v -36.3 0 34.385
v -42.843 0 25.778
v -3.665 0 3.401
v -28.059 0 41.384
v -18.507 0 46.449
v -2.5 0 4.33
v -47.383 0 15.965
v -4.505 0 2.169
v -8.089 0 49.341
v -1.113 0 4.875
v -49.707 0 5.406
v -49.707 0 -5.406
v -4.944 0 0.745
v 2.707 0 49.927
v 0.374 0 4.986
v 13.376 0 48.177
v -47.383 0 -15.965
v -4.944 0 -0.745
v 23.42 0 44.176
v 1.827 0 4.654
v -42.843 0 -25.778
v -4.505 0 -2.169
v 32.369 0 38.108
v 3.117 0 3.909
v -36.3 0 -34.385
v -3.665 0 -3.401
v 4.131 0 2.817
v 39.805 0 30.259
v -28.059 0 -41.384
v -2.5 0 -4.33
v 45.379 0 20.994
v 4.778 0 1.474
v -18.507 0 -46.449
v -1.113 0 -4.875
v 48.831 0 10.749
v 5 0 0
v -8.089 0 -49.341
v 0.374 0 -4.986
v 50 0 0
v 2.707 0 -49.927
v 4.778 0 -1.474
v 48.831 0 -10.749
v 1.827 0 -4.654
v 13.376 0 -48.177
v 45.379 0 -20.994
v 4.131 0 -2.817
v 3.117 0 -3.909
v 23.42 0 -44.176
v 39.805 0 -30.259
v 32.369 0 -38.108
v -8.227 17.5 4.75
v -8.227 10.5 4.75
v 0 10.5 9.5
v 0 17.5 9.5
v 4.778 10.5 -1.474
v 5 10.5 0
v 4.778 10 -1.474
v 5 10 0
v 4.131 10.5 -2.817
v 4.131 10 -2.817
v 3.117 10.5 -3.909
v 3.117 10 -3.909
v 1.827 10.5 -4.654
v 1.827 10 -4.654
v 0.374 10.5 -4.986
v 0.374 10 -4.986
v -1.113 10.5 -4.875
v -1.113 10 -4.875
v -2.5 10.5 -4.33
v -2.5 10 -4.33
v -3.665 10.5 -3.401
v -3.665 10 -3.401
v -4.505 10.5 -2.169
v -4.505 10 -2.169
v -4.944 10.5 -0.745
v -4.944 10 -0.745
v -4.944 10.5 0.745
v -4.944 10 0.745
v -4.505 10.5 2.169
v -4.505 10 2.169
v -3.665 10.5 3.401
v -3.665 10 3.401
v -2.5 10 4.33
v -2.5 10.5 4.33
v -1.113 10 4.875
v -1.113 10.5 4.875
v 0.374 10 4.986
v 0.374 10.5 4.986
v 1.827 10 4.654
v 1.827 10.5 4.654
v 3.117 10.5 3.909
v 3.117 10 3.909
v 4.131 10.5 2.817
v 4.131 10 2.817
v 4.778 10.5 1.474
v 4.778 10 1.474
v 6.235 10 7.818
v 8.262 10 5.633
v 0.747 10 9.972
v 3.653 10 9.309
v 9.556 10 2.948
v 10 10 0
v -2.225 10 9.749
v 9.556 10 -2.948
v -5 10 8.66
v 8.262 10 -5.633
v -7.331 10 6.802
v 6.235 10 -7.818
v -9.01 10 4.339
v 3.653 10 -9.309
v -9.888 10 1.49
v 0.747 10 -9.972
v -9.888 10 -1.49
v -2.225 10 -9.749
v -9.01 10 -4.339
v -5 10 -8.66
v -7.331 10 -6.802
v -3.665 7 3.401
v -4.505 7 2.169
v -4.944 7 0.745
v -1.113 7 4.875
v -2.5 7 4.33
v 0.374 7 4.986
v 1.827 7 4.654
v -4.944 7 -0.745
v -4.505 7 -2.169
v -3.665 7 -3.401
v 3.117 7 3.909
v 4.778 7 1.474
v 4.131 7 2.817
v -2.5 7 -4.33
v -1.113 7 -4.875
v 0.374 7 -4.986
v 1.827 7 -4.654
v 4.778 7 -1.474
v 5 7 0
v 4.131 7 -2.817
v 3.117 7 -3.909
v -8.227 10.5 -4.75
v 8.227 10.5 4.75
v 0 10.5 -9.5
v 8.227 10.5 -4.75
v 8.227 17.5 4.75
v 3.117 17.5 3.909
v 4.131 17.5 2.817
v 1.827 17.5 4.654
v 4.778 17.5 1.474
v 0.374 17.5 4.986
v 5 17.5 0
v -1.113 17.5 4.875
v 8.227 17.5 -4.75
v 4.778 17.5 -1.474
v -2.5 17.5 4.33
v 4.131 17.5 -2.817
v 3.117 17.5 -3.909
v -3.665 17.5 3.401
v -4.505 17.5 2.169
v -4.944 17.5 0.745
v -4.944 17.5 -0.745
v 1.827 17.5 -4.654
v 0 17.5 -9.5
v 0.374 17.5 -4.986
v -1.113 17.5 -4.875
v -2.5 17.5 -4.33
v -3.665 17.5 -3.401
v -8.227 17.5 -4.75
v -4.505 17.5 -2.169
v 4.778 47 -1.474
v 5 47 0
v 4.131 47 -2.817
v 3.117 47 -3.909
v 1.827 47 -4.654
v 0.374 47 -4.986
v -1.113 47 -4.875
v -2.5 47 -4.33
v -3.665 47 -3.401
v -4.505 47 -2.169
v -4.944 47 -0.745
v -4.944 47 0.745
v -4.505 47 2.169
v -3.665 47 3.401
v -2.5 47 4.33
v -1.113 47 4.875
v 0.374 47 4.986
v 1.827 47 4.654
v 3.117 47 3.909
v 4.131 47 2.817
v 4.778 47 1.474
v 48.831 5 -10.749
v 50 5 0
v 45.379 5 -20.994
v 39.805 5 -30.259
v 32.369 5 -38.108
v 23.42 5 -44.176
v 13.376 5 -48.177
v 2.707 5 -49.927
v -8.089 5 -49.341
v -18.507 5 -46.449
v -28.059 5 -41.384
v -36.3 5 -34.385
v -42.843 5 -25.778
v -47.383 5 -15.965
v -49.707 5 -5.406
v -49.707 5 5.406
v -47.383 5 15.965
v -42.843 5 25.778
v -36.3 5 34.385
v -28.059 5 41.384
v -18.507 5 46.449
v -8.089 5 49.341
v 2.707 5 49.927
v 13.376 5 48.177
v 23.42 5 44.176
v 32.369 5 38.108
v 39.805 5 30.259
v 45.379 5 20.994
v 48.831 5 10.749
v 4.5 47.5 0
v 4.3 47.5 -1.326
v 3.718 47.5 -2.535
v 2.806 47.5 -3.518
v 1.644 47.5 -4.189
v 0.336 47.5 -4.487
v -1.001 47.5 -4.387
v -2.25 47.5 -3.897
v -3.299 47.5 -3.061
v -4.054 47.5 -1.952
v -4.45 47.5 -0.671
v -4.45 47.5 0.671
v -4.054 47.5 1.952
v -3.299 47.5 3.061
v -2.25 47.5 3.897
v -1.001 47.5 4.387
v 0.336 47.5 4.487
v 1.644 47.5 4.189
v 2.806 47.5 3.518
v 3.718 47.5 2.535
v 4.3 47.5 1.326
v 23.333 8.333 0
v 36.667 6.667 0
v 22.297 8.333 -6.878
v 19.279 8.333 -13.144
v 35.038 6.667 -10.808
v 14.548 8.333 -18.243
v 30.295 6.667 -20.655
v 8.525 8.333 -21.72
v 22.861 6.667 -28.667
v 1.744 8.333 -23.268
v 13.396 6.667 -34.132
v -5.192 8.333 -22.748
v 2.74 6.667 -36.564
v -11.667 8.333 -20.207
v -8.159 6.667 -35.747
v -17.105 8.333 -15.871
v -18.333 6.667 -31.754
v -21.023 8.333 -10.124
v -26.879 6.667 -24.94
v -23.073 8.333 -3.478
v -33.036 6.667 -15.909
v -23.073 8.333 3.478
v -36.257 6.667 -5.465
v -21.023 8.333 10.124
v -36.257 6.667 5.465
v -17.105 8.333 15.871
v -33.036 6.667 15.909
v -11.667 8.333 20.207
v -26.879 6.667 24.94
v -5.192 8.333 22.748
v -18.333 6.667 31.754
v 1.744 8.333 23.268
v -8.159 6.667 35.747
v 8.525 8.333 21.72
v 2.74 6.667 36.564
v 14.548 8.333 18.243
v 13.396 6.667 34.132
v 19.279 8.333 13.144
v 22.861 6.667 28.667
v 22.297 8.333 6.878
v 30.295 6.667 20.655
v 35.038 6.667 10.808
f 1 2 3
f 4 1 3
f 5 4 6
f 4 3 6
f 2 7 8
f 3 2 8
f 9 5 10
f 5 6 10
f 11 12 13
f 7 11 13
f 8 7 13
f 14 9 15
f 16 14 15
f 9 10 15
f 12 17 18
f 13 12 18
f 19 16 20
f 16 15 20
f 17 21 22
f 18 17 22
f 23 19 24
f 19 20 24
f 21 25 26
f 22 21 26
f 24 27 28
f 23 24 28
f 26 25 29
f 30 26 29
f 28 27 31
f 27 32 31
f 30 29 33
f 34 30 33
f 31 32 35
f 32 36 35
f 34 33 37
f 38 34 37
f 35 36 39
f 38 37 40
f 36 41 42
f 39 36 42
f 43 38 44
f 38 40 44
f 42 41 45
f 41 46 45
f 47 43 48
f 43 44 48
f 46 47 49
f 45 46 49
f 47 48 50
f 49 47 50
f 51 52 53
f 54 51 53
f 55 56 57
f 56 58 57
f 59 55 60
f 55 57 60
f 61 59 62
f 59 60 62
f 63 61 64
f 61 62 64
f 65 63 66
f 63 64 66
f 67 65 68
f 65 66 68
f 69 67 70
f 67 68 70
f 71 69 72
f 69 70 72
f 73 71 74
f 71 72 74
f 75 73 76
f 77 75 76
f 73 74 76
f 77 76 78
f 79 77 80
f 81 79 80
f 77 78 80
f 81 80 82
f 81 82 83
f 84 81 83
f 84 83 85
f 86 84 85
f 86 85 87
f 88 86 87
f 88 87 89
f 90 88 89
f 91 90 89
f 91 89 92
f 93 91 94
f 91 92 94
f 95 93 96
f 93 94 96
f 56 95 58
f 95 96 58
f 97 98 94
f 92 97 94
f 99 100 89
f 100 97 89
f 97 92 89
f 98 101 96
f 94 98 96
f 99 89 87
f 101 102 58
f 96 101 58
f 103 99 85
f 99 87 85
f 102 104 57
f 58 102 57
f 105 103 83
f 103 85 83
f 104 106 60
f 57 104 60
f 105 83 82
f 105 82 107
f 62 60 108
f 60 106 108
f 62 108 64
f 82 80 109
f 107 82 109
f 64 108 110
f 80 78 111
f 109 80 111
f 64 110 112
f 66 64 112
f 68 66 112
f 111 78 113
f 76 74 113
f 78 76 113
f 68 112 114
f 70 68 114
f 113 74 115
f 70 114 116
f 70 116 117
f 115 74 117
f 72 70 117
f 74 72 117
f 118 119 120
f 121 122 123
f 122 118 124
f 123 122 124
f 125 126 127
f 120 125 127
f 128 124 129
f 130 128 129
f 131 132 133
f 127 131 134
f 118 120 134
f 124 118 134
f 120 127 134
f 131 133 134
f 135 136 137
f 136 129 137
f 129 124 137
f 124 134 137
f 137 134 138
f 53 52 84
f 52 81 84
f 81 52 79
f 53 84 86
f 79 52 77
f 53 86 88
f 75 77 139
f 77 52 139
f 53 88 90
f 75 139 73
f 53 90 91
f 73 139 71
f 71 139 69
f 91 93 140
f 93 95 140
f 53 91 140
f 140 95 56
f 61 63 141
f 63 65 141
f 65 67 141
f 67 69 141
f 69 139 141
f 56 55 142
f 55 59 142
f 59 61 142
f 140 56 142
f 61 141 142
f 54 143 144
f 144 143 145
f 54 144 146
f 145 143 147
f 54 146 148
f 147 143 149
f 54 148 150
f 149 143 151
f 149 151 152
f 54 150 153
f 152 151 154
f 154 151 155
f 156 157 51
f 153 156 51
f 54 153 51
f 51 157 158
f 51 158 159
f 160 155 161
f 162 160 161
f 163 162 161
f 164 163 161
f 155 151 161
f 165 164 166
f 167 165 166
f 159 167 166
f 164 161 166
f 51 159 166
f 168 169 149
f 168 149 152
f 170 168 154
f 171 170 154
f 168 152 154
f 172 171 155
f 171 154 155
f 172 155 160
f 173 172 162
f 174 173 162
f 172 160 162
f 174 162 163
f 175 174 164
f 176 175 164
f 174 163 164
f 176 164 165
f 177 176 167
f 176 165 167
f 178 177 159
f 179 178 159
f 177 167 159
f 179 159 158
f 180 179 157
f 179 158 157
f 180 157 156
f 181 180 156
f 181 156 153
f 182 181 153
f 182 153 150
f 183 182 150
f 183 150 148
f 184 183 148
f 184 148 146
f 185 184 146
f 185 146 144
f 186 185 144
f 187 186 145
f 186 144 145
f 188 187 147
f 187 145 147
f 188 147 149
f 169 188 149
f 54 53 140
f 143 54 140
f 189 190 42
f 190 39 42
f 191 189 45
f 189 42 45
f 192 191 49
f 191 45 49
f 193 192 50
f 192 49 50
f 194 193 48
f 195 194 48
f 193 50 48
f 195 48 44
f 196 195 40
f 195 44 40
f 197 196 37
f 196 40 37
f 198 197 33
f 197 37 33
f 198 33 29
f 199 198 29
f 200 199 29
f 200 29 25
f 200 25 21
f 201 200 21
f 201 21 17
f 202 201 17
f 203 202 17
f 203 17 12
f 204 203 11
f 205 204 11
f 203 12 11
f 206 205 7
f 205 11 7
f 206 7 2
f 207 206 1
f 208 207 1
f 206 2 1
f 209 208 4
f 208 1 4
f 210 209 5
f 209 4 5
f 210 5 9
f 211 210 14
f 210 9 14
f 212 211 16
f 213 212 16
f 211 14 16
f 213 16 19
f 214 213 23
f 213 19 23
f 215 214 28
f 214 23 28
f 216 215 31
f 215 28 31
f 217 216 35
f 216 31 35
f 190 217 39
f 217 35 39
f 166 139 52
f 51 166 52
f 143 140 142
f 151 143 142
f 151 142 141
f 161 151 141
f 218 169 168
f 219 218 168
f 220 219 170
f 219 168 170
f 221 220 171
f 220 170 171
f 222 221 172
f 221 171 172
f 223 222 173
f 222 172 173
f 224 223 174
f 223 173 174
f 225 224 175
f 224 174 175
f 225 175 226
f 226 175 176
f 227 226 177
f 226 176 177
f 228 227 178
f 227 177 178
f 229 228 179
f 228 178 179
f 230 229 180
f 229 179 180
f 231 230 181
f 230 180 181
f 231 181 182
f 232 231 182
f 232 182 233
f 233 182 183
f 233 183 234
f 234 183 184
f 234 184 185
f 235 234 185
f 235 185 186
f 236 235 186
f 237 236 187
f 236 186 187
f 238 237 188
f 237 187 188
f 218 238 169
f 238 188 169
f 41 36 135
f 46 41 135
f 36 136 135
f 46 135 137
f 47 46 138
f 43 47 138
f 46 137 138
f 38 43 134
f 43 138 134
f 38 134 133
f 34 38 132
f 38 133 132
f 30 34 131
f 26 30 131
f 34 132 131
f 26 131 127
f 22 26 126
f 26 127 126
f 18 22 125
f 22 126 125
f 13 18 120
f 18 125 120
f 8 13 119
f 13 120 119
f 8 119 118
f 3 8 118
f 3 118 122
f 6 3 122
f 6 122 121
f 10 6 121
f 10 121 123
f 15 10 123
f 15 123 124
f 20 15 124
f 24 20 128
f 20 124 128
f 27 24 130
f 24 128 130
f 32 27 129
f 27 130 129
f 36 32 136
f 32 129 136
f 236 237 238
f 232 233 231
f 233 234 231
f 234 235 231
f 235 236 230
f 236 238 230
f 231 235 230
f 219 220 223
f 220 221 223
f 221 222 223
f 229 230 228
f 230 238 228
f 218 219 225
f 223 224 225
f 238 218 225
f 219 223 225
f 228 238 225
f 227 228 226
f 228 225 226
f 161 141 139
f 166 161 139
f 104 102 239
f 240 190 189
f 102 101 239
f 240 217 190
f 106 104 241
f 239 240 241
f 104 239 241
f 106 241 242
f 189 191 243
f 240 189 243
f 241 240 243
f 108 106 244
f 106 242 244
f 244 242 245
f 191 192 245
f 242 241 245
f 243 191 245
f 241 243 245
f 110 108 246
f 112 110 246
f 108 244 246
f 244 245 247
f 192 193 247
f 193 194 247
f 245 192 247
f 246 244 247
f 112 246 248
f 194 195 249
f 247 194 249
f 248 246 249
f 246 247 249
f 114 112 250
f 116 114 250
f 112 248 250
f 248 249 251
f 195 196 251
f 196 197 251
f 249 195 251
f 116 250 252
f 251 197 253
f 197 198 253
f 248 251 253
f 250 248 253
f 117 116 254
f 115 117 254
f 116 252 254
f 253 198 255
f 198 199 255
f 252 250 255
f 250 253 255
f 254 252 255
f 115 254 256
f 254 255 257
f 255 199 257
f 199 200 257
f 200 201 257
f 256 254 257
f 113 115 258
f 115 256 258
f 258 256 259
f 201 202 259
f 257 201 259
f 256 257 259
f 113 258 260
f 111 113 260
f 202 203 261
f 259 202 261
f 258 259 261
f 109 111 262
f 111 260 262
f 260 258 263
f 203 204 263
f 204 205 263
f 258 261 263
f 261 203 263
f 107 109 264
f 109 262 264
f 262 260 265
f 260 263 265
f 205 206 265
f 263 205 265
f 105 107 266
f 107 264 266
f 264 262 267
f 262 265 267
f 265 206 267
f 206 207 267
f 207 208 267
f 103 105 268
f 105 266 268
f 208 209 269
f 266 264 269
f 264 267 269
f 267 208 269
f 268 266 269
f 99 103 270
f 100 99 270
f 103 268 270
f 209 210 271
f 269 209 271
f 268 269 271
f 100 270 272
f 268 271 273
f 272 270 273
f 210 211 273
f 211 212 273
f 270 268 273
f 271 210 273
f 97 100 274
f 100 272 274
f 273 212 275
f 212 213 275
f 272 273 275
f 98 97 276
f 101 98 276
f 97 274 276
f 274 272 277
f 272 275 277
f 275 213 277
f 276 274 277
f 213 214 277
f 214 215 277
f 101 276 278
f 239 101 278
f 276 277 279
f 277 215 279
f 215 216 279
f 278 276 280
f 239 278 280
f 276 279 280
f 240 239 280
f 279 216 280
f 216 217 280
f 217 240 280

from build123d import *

# Parameters (mm, degrees)
CHAMFER_1_SIZE      = 0.5
CUT_EXTRUDE_START   = -7
SKETCH_2_R          = 12.139773641
CUT_EXTRUDE_1_DEPTH = 7


with BuildPart() as part:
    # Эскиз1 → Повернуть1 (revolve)
    with BuildSketch(Plane.XY, mode=Mode.PRIVATE) as revolve_1_sk:
        Polygon((0, 47.5), (-5, 47.5), (-5, 17.5), (-9.5, 17.5), (-9.5, 10.5), (-5, 10.5), (-5, 10), (-10, 10), (-50, 5), (-50, 0), (-5, 0), (-5, 7), (0, 7), align=None)
    revolve(revolve_1_sk.sketch.rotate(Axis((0, 0, 0), (0, 1, 0)), 180), axis=Axis((0, 0, 0), (0, 1, 0)))  # turned: the seam where the file's is

    # Фаска1
    chamfer_1_edges = [part.edges().sort_by_distance(p)[0] for p in [
        (-5, 47.5, 0),
    ]]
    chamfer(chamfer_1_edges, length=CHAMFER_1_SIZE)

    # Эскиз2 → Вырез-Вытянуть1 (cut)
    with BuildSketch(Plane(origin=(0, 17.5, 0), x_dir=(1, 0, 0), z_dir=(0, 1, 0)).offset(CUT_EXTRUDE_START)):
        Circle(SKETCH_2_R)
        Polygon((0, 9.5), (-8.227241336, 4.75), (-8.227241336, -4.75), (0, -9.5), (8.227241336, -4.75), (8.227241336, 4.75), align=None, mode=Mode.SUBTRACT)
    extrude(amount=CUT_EXTRUDE_1_DEPTH, mode=Mode.SUBTRACT)


solid = part.part
